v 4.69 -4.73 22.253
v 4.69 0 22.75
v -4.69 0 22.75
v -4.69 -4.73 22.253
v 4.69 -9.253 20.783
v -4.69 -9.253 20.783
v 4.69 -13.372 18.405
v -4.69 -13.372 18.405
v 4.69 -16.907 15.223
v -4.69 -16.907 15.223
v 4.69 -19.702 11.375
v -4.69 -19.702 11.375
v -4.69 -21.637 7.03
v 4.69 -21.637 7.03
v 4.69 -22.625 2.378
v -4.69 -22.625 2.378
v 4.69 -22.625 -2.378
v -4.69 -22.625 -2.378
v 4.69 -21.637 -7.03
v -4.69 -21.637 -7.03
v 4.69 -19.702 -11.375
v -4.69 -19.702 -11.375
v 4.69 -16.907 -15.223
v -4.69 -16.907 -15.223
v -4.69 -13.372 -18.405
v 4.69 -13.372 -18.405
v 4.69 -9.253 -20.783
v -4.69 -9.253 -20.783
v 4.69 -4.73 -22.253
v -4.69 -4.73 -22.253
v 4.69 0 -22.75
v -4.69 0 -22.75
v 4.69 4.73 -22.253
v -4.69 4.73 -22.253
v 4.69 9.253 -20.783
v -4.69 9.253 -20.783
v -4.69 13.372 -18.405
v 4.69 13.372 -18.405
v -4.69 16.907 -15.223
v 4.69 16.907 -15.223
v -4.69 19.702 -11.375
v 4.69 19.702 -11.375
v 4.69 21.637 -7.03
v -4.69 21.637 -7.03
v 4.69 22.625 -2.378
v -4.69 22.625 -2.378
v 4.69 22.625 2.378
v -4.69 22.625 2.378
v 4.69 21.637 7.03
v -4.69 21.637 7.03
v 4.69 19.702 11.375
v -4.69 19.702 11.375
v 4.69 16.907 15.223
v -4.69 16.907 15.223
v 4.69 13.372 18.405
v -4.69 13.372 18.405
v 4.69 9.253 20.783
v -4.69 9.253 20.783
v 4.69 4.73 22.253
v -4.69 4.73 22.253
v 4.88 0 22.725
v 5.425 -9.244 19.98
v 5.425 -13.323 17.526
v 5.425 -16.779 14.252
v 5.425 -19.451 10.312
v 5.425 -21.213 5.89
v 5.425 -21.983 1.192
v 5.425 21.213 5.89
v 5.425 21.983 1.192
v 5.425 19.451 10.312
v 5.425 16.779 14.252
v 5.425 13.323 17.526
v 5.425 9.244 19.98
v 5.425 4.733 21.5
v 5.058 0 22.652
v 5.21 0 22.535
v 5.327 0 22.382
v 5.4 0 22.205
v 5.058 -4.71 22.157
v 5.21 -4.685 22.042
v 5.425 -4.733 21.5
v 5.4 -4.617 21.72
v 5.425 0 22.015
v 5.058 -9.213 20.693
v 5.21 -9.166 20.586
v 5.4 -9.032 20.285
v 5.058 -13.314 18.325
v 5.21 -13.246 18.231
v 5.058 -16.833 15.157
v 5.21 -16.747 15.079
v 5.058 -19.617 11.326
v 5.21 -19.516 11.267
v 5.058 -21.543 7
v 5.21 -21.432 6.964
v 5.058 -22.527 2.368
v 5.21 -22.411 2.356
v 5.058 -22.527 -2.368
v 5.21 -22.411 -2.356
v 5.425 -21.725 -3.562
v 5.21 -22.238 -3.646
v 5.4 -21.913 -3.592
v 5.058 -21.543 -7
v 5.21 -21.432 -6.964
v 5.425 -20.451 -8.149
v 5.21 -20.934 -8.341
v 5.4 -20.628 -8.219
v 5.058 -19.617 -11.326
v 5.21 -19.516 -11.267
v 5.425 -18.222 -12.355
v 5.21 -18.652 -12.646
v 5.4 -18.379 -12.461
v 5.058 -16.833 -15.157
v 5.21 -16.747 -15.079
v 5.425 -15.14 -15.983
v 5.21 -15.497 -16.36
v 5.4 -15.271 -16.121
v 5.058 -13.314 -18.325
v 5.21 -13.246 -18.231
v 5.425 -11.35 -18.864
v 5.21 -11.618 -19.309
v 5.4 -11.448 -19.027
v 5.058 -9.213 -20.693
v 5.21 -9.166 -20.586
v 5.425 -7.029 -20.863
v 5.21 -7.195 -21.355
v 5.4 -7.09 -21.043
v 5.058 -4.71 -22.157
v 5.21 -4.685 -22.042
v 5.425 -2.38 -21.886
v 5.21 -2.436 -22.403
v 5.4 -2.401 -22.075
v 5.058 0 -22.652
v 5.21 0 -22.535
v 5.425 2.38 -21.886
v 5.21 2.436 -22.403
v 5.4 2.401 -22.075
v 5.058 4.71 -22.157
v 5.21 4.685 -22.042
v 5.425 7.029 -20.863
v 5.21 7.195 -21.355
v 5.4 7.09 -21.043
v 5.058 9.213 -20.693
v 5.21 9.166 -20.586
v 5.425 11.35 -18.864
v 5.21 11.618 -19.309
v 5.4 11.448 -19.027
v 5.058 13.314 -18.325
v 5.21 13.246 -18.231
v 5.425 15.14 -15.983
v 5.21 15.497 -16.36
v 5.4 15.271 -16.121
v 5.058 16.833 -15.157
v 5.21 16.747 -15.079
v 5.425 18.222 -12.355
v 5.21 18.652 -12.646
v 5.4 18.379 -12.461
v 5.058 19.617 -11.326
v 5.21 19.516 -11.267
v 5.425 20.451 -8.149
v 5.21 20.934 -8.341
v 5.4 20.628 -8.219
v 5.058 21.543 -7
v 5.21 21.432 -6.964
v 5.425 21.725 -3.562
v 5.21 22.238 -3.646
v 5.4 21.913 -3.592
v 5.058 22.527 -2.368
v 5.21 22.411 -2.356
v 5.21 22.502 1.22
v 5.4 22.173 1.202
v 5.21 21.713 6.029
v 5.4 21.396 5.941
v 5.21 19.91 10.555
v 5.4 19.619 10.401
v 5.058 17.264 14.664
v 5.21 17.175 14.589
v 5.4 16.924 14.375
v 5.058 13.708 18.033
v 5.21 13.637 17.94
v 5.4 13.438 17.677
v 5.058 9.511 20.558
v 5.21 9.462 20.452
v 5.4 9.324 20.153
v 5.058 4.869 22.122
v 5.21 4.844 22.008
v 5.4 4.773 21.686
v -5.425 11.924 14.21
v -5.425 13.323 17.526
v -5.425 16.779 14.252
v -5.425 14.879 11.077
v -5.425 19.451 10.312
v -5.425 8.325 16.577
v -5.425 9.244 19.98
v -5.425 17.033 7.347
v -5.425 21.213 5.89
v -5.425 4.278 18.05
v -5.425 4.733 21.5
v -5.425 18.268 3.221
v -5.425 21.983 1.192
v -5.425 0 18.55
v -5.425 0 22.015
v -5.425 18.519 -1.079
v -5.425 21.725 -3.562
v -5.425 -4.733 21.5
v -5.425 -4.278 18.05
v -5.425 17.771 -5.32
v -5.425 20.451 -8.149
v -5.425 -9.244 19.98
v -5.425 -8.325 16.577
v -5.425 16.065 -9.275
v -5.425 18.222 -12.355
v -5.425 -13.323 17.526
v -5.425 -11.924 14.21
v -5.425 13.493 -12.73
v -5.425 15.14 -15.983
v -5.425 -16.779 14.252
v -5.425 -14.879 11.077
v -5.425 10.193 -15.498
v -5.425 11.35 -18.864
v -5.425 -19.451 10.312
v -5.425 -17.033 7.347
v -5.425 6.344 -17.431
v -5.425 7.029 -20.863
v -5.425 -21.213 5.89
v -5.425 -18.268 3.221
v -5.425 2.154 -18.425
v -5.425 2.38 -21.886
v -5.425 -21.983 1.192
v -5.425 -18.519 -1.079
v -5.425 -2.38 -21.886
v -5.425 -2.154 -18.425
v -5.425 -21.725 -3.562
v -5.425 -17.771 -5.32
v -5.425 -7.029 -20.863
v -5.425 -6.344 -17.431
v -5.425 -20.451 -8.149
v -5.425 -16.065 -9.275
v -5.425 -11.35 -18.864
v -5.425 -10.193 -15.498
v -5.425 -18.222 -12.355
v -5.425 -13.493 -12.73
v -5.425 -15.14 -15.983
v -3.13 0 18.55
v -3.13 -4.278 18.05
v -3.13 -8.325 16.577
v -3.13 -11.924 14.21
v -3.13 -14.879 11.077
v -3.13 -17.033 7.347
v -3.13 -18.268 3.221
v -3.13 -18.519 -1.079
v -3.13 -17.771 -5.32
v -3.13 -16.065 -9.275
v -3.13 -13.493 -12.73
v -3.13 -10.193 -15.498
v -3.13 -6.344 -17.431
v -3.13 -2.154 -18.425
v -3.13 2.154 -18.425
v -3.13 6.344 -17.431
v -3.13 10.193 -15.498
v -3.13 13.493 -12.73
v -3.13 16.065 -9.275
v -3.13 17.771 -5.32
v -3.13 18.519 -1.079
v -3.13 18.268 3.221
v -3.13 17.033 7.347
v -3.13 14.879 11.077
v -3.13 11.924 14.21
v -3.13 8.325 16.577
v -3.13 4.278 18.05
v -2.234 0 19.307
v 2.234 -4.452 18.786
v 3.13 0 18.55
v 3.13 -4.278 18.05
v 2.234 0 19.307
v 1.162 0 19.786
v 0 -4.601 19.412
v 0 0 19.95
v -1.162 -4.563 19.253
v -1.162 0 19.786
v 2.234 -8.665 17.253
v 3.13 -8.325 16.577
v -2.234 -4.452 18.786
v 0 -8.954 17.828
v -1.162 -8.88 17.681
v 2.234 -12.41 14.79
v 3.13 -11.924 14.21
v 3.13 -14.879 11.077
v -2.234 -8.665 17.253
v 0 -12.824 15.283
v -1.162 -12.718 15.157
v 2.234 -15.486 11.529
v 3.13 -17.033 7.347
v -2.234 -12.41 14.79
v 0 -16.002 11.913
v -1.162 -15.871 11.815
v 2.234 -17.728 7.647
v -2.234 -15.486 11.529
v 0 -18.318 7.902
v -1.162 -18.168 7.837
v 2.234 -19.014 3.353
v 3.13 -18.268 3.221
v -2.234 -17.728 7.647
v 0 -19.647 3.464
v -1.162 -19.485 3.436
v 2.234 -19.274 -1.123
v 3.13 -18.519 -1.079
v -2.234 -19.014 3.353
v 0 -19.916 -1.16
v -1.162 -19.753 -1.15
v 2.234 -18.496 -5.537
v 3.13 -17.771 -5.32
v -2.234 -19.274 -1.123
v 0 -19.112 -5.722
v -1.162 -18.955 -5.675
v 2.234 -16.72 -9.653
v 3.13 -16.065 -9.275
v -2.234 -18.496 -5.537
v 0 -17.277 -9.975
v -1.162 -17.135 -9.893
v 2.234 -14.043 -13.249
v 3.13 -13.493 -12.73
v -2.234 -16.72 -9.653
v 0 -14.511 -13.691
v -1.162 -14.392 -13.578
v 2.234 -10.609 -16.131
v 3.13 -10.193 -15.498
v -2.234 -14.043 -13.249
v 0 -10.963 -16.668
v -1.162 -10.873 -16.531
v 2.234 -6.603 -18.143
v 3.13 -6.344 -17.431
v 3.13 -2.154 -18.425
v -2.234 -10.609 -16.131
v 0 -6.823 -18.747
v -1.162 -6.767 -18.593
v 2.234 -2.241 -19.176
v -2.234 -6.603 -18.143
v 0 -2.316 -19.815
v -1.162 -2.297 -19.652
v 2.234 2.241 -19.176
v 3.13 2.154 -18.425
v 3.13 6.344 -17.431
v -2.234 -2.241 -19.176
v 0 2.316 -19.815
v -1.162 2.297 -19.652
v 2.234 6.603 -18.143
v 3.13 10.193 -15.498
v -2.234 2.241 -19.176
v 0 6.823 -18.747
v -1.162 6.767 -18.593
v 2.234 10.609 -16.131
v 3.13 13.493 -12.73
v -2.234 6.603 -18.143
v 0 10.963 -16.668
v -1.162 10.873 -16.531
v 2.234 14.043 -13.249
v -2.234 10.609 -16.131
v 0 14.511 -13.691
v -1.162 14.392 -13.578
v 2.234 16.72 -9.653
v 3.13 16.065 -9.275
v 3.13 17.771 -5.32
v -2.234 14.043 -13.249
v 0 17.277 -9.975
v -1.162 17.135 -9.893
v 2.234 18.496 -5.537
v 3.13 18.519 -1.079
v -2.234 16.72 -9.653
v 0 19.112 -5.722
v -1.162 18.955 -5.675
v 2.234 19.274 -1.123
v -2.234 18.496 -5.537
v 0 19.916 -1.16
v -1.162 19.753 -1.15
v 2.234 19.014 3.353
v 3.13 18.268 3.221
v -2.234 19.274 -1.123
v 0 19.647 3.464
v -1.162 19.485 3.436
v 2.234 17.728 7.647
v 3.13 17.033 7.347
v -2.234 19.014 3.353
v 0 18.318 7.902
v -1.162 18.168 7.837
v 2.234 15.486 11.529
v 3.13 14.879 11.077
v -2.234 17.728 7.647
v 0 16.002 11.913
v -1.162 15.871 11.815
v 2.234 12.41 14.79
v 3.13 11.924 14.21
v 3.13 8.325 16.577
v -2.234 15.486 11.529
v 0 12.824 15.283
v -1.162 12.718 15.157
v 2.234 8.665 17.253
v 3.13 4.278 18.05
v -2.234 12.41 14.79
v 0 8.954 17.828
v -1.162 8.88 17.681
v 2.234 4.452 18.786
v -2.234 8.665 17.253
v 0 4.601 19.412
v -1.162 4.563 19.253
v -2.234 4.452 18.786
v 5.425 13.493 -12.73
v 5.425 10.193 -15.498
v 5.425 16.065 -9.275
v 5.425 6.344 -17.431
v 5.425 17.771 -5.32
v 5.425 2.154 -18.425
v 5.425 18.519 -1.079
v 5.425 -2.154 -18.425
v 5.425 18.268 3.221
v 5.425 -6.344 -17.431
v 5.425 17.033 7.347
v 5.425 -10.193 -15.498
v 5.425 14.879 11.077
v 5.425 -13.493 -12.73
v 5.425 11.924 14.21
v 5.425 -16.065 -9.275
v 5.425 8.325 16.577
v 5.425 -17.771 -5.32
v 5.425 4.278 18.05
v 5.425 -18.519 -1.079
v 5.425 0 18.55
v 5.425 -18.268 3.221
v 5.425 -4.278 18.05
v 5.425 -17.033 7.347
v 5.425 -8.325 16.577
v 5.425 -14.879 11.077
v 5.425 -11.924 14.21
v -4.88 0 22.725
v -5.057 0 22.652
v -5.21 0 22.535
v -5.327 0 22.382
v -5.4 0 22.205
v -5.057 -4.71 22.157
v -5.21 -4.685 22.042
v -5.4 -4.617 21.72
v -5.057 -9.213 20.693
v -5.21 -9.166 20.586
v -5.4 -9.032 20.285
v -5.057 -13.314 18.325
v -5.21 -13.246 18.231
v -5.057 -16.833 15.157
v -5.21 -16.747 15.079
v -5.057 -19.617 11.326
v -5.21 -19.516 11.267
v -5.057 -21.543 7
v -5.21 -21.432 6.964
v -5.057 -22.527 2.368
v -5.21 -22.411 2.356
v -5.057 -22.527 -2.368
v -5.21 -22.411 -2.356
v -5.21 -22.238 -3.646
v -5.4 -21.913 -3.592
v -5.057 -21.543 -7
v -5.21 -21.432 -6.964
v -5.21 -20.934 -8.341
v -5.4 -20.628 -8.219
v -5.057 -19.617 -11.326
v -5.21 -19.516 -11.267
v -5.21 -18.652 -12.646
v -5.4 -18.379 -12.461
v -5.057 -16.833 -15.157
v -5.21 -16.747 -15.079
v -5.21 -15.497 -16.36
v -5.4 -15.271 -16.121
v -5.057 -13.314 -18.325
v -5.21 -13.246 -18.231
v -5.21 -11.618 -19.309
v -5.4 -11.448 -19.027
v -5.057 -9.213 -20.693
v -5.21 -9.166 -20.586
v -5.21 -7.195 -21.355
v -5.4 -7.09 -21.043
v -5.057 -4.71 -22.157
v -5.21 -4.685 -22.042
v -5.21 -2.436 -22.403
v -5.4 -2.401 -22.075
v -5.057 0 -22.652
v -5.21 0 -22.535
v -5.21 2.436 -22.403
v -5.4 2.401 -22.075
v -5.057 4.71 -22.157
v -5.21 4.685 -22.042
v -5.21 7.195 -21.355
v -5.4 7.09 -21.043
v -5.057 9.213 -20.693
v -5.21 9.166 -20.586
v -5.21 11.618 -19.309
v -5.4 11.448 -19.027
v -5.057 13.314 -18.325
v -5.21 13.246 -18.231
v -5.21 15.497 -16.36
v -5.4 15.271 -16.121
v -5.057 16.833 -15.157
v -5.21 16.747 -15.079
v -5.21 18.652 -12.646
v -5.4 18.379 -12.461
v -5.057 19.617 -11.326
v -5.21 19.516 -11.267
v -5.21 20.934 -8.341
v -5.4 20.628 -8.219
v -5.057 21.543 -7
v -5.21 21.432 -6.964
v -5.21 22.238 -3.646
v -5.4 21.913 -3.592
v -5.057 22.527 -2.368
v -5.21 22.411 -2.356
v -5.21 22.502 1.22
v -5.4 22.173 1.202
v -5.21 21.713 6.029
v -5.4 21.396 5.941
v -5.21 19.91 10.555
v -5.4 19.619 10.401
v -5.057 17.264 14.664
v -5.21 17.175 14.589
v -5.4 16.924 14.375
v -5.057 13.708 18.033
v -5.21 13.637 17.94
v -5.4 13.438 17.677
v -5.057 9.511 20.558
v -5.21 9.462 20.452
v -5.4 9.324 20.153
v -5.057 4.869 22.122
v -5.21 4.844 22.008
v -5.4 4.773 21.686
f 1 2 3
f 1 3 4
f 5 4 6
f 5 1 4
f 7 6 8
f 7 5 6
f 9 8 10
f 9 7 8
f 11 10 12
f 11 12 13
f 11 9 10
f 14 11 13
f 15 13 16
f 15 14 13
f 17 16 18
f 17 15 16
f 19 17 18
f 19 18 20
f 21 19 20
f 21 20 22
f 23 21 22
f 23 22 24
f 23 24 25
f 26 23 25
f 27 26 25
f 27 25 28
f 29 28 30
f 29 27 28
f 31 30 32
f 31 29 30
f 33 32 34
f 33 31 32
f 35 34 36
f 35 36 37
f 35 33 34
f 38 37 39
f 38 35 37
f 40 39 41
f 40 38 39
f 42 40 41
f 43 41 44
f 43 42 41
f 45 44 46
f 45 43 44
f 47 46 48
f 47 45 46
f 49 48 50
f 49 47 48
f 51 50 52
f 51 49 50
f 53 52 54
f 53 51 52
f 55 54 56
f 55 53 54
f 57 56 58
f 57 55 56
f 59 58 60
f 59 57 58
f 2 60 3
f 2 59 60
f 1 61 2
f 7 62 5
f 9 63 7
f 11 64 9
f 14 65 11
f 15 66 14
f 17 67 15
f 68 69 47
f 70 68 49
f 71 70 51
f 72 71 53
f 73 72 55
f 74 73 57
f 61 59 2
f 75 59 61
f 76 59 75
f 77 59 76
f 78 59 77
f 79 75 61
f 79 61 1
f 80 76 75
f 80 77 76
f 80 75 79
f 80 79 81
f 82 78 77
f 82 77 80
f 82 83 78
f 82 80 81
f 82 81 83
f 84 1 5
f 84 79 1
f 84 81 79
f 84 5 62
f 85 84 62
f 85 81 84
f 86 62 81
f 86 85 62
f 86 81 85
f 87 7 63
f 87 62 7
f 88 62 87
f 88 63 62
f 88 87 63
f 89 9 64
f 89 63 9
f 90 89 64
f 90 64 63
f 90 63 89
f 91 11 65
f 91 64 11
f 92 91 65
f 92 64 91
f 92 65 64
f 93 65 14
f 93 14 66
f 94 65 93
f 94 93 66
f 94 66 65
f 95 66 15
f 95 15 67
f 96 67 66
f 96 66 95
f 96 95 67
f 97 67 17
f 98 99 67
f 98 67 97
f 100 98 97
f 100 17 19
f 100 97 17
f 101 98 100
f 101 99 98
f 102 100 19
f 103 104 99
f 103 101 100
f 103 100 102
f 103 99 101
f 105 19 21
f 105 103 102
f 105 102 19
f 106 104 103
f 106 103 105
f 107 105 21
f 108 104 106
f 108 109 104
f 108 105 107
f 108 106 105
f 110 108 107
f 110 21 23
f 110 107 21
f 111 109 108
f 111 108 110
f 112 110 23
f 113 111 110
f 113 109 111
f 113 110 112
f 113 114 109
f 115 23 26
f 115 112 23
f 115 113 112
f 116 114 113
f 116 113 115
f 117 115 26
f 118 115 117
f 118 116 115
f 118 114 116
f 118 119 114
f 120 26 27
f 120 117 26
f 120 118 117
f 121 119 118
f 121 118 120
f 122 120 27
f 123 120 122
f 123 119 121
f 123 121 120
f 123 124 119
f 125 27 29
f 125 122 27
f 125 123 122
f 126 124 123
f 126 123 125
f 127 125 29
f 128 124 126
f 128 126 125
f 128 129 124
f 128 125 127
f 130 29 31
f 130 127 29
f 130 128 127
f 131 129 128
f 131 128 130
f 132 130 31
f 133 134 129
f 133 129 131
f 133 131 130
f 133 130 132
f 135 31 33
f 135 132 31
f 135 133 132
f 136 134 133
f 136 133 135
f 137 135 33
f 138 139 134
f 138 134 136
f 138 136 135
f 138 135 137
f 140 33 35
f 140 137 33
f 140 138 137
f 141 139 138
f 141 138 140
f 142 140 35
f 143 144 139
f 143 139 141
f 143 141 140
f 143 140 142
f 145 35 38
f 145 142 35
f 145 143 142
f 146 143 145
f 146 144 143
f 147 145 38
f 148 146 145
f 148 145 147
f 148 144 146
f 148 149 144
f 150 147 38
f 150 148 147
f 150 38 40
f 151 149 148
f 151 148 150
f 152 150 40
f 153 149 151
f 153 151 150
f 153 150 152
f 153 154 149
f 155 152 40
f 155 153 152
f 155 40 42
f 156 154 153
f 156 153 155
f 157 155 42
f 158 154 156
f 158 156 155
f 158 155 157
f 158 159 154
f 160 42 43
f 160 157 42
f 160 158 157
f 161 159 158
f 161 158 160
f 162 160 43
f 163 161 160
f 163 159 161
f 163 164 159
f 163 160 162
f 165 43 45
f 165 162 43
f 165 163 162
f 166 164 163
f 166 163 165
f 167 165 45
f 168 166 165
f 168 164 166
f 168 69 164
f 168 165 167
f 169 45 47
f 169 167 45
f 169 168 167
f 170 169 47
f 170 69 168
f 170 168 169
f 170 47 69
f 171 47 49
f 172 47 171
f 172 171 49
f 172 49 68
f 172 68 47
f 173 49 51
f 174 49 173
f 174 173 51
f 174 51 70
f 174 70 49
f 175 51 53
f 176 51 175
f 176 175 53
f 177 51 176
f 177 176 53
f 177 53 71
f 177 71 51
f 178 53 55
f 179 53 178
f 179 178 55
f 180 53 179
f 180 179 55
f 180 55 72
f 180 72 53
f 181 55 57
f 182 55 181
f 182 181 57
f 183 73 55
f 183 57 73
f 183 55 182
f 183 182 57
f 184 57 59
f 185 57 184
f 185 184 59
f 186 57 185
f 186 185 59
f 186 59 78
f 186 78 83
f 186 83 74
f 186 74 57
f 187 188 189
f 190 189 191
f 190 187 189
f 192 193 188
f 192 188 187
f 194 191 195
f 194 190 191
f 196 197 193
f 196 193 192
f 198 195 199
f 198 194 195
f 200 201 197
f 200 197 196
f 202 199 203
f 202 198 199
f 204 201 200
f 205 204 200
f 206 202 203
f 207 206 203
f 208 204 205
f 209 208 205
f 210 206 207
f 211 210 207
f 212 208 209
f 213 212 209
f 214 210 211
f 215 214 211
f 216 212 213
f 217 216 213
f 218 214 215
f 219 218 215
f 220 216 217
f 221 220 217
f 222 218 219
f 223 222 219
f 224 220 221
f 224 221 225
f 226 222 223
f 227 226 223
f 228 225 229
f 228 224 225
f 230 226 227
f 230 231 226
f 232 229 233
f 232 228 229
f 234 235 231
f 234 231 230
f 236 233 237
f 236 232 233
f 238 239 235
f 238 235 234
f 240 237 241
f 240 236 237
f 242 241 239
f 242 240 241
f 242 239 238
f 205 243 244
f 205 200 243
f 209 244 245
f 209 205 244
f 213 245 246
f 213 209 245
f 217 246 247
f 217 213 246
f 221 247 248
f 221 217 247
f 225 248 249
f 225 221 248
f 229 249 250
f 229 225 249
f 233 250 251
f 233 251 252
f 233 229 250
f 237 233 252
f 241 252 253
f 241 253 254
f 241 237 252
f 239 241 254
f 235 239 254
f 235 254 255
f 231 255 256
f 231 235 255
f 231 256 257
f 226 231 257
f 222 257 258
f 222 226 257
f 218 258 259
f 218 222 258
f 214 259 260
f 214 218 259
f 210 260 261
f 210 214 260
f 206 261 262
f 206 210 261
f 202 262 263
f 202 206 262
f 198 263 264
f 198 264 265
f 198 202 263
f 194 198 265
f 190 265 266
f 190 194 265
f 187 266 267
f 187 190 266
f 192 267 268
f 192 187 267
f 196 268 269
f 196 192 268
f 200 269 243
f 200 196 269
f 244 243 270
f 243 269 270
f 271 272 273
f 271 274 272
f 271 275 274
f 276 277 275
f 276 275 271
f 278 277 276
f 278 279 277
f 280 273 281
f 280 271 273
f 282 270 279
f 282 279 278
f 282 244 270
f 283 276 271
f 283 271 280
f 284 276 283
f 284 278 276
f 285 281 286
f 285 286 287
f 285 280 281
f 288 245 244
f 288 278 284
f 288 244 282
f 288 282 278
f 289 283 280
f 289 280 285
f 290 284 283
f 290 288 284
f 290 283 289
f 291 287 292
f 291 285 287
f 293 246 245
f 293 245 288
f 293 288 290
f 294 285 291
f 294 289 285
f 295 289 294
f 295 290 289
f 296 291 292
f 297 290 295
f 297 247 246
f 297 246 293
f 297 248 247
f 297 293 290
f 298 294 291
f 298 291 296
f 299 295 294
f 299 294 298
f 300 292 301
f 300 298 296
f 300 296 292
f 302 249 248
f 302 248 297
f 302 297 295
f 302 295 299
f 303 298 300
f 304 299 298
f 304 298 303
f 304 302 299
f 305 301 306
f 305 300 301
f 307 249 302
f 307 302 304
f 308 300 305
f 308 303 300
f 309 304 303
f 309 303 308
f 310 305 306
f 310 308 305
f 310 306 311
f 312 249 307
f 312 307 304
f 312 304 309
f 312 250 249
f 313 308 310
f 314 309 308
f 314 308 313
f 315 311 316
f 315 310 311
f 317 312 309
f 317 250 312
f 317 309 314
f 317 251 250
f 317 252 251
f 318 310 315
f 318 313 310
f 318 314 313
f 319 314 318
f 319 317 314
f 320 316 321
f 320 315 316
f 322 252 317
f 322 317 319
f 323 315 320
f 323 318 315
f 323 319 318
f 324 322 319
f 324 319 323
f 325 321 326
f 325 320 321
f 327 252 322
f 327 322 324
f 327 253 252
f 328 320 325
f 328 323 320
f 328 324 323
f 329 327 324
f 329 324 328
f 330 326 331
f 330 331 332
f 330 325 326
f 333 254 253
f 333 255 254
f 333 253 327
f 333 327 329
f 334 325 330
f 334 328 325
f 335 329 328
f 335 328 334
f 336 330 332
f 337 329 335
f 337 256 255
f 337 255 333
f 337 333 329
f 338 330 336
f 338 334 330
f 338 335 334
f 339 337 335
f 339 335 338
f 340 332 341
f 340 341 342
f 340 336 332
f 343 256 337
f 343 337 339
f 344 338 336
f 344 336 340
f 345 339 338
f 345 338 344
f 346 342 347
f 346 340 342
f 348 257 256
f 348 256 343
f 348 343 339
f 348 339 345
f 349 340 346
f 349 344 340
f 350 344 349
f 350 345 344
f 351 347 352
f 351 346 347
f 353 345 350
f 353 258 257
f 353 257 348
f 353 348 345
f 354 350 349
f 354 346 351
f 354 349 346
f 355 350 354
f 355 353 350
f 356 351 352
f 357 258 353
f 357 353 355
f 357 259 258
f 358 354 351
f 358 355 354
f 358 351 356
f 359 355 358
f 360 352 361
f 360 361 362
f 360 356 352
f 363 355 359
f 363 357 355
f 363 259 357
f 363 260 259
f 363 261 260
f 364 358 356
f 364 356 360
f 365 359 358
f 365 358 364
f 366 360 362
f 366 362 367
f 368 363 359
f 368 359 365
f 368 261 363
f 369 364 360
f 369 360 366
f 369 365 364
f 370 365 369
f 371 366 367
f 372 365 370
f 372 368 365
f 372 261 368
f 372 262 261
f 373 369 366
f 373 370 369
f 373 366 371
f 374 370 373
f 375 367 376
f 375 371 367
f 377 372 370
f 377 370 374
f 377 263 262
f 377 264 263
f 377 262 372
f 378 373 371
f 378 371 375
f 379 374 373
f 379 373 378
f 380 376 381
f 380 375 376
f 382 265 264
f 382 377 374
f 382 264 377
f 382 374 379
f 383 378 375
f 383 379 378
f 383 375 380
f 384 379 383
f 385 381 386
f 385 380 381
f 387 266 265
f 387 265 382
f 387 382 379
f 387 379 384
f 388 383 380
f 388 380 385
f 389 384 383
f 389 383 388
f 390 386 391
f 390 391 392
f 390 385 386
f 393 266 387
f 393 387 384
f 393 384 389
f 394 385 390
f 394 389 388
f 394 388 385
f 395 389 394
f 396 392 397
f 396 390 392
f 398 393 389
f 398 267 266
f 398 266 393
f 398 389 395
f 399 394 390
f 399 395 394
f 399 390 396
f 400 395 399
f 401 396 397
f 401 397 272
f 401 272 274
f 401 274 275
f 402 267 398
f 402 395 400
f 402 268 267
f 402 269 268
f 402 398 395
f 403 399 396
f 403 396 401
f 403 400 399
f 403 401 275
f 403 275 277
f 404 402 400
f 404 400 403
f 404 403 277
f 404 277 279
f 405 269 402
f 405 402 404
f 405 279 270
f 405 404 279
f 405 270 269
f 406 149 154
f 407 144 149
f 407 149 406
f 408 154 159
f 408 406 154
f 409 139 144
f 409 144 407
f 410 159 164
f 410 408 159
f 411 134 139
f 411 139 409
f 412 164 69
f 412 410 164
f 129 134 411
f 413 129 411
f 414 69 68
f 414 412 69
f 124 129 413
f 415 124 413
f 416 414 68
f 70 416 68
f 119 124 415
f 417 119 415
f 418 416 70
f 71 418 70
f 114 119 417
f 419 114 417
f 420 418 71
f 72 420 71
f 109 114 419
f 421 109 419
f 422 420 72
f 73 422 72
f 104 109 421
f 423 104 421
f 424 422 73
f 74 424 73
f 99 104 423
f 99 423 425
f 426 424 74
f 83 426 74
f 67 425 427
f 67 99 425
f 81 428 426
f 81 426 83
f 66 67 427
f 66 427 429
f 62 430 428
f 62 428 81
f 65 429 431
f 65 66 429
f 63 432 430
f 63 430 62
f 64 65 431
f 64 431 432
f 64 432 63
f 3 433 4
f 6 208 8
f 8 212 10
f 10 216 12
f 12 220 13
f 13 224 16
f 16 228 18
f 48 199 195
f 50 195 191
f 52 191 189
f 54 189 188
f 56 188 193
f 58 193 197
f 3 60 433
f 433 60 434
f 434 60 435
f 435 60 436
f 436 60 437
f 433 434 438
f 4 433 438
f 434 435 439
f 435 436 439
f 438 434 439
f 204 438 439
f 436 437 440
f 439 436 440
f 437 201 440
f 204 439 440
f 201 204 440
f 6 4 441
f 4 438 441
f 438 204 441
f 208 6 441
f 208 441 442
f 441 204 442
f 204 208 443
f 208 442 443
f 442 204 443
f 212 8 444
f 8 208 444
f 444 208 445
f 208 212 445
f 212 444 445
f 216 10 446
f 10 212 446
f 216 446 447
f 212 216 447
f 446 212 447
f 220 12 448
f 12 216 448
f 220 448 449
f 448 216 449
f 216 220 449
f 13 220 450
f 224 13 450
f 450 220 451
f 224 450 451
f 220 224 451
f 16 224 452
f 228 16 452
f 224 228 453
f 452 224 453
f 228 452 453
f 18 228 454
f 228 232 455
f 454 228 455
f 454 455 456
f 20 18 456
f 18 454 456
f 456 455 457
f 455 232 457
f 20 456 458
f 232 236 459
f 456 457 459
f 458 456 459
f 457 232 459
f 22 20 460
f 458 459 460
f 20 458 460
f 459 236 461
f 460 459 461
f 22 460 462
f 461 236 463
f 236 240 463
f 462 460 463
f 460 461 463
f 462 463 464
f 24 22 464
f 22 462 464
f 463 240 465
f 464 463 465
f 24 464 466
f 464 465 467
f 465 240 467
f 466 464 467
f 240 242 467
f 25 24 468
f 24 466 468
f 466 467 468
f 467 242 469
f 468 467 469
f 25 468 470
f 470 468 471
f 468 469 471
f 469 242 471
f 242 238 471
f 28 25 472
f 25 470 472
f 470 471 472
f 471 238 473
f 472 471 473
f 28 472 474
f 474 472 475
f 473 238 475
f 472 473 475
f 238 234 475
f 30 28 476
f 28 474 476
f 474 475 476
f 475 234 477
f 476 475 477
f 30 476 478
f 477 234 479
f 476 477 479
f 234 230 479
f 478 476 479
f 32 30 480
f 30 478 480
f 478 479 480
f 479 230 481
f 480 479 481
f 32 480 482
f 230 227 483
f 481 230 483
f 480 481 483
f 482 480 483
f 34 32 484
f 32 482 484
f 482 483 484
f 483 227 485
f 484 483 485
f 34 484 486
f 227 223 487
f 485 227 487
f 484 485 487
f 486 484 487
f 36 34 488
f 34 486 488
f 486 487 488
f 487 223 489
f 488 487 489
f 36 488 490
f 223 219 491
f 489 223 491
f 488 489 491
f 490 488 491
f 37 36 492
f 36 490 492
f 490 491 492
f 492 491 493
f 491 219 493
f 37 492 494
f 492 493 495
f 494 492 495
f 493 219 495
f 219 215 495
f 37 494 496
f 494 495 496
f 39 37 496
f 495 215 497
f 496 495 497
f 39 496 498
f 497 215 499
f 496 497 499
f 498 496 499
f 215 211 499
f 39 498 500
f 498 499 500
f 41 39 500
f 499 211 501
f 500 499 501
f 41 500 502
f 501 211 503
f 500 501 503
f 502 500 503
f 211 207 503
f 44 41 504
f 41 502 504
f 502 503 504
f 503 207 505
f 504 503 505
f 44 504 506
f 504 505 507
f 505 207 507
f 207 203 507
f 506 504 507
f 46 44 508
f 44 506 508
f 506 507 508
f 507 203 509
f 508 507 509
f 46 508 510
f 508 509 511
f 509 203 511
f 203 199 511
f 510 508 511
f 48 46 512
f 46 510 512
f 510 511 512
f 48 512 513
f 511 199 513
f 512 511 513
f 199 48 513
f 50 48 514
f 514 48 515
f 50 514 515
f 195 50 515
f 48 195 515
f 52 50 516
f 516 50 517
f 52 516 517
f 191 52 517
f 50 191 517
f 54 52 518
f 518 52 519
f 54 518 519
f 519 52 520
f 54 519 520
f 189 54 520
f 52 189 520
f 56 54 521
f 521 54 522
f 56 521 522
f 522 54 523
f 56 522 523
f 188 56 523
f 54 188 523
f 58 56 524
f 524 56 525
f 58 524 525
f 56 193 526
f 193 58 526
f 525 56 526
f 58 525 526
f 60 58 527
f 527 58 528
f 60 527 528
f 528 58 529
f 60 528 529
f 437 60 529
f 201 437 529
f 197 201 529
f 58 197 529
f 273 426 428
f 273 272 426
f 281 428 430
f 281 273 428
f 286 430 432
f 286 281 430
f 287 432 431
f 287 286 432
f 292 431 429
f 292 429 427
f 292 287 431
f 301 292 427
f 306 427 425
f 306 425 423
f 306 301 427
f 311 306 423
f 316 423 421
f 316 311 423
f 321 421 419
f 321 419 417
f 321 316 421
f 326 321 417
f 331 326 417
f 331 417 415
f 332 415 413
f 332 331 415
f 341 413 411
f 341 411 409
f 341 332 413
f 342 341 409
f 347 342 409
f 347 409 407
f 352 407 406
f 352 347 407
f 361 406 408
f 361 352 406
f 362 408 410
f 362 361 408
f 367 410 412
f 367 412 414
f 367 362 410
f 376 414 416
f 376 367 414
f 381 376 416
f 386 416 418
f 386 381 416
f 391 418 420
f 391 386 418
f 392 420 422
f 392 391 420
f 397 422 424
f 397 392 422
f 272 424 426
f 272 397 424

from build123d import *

# Parameters (mm, degrees)
FILLET1_R    = 2.1
SCALE1_SCALE = 0.35


with BuildPart() as part:
    # Sketch1 → Revolve1 (revolve)
    with BuildSketch(Plane.XY, mode=Mode.PRIVATE) as revolve1_sk:
        with BuildLine():
            Line((-15.5, 65), (15.5, 65))
            Line((15.5, 65), (15.5, 53))
            Line((15.5, 53), (8.94427191, 53))
            ThreePointArc((8.94427191, 53), (0, 57), (-8.94427191, 53))
            Line((-8.94427191, 53), (-15.5, 53))
            Line((-15.5, 53), (-15.5, 65))
        make_face()
    revolve(revolve1_sk.sketch.rotate(Axis((-25.358454362, 0, 0), (1, 0, 0)), 90), axis=Axis((-25.358454362, 0, 0), (1, 0, 0)))

    # Fillet1
    fillet1_edges = [part.edges().sort_by_distance(p)[0] for p in [
        (15.5, 0, -65),
        (-15.5, 0, -65),
    ]]
    fillet(fillet1_edges, radius=FILLET1_R)


with BuildPart() as part_1:
    # Scale1: scaled about (0, 0, 0)
    add(part.part.scale(SCALE1_SCALE))


solid = part_1.part
